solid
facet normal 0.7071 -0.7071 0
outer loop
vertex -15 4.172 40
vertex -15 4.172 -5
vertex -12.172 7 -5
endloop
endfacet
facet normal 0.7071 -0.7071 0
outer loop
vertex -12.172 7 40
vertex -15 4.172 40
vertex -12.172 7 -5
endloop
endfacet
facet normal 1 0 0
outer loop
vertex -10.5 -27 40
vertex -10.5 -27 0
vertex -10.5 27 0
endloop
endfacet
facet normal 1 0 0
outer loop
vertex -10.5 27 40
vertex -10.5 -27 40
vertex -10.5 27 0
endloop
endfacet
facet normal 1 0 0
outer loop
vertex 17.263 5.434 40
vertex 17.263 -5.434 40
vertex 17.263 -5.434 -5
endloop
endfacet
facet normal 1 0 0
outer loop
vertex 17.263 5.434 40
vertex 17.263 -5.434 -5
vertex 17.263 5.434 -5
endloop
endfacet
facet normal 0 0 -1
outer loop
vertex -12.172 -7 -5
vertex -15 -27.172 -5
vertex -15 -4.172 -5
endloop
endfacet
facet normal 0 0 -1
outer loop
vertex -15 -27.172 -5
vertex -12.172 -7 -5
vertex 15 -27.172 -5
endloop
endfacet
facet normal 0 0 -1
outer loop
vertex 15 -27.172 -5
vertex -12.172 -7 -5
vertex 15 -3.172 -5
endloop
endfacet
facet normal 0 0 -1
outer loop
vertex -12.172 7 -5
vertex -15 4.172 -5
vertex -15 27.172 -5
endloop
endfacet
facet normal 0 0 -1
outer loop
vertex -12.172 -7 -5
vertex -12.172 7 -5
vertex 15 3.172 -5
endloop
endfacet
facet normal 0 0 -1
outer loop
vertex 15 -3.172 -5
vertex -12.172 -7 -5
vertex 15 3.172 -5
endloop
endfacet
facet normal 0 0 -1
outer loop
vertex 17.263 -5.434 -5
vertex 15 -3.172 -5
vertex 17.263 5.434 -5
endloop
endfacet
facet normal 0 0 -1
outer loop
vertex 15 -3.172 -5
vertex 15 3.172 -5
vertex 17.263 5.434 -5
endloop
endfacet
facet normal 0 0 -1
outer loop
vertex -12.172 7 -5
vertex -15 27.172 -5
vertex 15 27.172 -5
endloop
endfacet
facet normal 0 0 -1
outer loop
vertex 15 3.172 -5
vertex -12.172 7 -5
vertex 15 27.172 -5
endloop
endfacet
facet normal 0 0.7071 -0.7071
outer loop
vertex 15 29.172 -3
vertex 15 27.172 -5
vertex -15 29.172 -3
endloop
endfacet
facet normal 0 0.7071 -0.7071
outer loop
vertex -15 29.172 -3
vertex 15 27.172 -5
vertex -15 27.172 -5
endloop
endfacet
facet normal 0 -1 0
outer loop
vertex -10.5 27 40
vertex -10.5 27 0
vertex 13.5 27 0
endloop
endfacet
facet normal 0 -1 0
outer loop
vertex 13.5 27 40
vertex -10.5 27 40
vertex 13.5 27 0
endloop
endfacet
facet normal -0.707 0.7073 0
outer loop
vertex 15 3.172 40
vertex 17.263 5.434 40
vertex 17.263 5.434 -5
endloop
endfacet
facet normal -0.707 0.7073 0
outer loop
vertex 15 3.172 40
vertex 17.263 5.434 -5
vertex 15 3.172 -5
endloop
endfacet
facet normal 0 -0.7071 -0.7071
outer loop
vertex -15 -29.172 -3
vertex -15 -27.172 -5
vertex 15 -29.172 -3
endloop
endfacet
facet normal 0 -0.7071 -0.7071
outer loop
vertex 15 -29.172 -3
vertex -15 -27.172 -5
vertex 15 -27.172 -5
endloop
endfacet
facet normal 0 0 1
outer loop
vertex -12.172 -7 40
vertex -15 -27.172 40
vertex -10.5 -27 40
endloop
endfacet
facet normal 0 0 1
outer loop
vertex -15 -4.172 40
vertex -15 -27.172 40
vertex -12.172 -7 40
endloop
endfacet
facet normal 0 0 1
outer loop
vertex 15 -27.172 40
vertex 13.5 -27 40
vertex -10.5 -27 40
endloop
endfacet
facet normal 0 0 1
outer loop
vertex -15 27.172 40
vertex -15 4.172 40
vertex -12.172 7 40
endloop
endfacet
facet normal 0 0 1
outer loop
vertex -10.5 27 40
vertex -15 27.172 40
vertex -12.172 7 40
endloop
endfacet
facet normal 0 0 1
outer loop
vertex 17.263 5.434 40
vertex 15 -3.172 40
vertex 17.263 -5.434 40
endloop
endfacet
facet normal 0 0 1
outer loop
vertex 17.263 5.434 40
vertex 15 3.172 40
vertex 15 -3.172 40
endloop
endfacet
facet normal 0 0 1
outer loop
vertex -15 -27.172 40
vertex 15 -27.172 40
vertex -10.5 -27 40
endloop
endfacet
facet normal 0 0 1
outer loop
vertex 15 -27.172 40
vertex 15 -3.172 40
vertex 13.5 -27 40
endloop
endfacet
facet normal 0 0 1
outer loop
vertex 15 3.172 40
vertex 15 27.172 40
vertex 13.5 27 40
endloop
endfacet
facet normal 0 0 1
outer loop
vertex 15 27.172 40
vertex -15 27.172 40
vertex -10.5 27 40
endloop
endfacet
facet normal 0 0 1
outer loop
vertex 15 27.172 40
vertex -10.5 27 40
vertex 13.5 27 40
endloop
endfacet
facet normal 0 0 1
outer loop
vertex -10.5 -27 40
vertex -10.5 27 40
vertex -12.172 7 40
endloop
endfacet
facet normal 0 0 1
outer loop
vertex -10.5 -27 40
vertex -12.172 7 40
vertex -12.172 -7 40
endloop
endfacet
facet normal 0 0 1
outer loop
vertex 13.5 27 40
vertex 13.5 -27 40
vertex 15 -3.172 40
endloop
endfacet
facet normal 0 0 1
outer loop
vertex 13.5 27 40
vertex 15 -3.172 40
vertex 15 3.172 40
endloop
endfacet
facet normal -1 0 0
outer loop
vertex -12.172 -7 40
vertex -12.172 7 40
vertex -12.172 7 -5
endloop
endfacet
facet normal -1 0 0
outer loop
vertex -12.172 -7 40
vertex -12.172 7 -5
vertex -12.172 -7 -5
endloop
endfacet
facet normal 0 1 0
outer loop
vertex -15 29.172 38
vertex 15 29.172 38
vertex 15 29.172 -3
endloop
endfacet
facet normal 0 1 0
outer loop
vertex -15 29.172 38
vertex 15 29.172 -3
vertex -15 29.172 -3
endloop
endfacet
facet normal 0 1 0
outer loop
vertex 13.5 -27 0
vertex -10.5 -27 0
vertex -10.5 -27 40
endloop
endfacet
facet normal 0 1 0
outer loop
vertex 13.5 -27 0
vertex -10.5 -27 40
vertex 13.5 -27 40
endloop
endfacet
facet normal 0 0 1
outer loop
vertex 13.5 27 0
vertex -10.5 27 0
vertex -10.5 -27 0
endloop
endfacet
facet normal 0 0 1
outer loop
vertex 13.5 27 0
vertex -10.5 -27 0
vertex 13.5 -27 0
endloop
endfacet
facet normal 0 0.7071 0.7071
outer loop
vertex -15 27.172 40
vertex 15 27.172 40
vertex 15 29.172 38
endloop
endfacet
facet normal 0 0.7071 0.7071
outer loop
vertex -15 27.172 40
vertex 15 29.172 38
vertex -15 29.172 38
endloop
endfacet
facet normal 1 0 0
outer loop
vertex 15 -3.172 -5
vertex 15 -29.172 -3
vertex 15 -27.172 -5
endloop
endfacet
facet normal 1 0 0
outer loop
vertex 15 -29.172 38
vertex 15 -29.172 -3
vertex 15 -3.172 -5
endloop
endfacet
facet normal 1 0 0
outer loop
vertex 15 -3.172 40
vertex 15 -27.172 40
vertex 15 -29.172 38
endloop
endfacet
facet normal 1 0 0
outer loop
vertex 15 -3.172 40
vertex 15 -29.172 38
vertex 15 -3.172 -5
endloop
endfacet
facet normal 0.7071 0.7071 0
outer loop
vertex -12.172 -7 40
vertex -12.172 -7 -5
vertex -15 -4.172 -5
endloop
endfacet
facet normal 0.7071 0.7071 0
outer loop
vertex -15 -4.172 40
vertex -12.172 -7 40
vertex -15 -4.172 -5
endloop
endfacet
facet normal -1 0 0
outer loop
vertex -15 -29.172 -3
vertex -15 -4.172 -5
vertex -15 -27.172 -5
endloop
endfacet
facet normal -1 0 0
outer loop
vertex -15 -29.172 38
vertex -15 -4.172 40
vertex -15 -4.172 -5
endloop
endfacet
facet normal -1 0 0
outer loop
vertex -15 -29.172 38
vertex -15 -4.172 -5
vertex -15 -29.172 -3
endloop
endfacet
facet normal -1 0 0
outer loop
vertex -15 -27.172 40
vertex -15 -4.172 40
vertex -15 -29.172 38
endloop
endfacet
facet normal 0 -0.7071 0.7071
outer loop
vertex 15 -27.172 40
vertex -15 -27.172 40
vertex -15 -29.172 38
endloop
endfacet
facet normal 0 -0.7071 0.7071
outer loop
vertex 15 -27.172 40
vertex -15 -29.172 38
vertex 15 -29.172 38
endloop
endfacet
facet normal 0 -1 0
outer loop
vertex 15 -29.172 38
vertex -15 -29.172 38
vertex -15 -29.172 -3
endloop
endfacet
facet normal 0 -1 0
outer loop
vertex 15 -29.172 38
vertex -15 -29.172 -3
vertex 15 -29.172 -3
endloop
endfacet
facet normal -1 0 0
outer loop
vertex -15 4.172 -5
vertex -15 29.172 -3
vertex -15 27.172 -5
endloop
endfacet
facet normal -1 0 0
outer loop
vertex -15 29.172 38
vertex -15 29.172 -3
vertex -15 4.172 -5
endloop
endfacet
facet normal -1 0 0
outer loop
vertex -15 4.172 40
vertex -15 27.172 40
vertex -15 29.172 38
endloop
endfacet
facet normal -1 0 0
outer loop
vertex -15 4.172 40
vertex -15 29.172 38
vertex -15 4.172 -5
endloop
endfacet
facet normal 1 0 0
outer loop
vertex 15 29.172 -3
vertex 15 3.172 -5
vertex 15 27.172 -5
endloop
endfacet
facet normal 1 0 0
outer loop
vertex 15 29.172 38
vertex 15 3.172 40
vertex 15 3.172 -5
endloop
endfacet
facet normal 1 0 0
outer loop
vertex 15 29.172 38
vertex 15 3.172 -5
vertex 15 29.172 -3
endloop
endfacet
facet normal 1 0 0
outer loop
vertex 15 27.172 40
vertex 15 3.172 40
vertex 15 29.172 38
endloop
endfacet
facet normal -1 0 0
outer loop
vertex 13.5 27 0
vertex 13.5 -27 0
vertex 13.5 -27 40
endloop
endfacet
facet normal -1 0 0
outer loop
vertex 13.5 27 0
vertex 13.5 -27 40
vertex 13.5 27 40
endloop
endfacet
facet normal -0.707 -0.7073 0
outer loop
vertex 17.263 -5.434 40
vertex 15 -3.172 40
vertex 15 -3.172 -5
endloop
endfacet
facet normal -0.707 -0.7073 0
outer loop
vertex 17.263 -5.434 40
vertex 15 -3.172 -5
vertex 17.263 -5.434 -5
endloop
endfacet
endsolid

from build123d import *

# Parameters (mm, degrees)
F0_W     = 24
F0_H     = 54
F1_DEPTH = 40
F2_DEPTH = 5
F3_SIZE  = 2


with BuildPart() as f1:
    # F0 (on Top) → F1 (new body)
    with BuildSketch(Plane.XY):
        Polygon((-15, 29.171573), (-15, 4.171573), (-12.171573, 7), (-12.171573, 0), (-12.171573, -7), (-15, -4.171573), (-15, -29.171573), (15, -29.171573), (15, -3.171573), (17.262742, -5.434315), (17.262742, -0.565685), (17.262742, 0.565685), (17.262742, 5.434315), (15, 3.171573), (15, 29.171573), align=None)
        with Locations((1.500004, 0)):
            Rectangle(F0_W, F0_H, mode=Mode.SUBTRACT)
    extrude(amount=F1_DEPTH)

    # F0 (on Top) → F2 (join)
    with BuildSketch(Plane.XY):
        Polygon((-15, 29.171573), (-15, 4.171573), (-12.171573, 7), (-12.171573, 0), (-12.171573, -7), (-15, -4.171573), (-15, -29.171573), (15, -29.171573), (15, -3.171573), (17.262742, -5.434315), (17.262742, -0.565685), (17.262742, 0.565685), (17.262742, 5.434315), (15, 3.171573), (15, 29.171573), align=None)
        with Locations((1.500004, 0)):
            Rectangle(F0_W, F0_H, mode=Mode.SUBTRACT)
        with Locations((1.500004, 0)):
            Rectangle(F0_W, F0_H)
    extrude(amount=-F2_DEPTH)

    # F3
    f3_edges = [f1.edges().sort_by_distance(p)[0] for p in [
        (0, -29.171573, -5),
        (0, 29.171573, -5),
        (0, -29.171573, 40),
        (0, 29.171573, 40),
    ]]
    chamfer(f3_edges, length=F3_SIZE)


solid = f1.part
